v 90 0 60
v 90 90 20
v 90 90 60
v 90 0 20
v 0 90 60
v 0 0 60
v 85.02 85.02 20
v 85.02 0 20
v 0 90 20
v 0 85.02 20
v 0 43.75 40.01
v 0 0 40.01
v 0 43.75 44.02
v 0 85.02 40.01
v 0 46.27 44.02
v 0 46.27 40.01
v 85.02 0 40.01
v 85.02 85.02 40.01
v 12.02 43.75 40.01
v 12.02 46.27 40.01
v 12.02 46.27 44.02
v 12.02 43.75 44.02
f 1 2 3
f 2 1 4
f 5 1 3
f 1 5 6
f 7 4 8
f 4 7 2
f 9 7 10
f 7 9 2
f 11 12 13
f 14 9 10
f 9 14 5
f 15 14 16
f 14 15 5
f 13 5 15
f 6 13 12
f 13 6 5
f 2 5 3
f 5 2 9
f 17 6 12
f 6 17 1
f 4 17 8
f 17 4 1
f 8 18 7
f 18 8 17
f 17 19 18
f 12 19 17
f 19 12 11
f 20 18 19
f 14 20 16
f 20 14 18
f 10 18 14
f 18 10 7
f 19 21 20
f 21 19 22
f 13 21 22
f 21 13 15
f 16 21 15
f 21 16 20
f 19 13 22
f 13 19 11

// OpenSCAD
$fn = 64;

// Dimensions
outer_width = 90;
outer_height = 90;
total_height = 40;
plate_thickness = 2;
wall_thickness = 2.5;
hole_diameter = 4.5;
hole_pattern_size = 71.5;
notch_width = 12;
notch_depth = 8;

// Calculated positions
half_outer = outer_width / 2;
half_inner = (outer_width - 2 * wall_thickness) / 2;
hole_offset = hole_pattern_size / 2;
notch_center_y = half_outer - wall_thickness / 2;
notch_center_z = total_height - notch_depth / 2;

difference() {
    // Main Body
    translate([0, 0, total_height / 2])
        cube([outer_width, outer_height, total_height]);

    // Inner Cavity Cut
    // Extends past Z=2 (plate) and Z=40 (open top)
    // Extends past X=±42.5 and Y=±42.5 (inner walls)
    translate([0, 0, 1.99])
        cube([outer_width - 2 * wall_thickness + 0.02, 
              outer_height - 2 * wall_thickness + 0.02, 
              total_height - 2 + 0.02]);

    // Screw Holes
    for(i = [-1, 1], j = [-1, 1]) {
        translate([i * hole_offset, j * hole_offset, 1])
            cylinder(d = hole_diameter, h = plate_thickness + 0.02);
    }

    // Cable Notch Cut
    // Located in the front wall (Y = +42.5 to +45)
    // Centred along the wall (X = 0)
    // Depth 8mm from open edge (Z = 32 to 40)
    translate([0, notch_center_y, notch_center_z])
        cube([notch_width + 0.02, wall_thickness + 0.02, notch_depth + 0.02]);
}
